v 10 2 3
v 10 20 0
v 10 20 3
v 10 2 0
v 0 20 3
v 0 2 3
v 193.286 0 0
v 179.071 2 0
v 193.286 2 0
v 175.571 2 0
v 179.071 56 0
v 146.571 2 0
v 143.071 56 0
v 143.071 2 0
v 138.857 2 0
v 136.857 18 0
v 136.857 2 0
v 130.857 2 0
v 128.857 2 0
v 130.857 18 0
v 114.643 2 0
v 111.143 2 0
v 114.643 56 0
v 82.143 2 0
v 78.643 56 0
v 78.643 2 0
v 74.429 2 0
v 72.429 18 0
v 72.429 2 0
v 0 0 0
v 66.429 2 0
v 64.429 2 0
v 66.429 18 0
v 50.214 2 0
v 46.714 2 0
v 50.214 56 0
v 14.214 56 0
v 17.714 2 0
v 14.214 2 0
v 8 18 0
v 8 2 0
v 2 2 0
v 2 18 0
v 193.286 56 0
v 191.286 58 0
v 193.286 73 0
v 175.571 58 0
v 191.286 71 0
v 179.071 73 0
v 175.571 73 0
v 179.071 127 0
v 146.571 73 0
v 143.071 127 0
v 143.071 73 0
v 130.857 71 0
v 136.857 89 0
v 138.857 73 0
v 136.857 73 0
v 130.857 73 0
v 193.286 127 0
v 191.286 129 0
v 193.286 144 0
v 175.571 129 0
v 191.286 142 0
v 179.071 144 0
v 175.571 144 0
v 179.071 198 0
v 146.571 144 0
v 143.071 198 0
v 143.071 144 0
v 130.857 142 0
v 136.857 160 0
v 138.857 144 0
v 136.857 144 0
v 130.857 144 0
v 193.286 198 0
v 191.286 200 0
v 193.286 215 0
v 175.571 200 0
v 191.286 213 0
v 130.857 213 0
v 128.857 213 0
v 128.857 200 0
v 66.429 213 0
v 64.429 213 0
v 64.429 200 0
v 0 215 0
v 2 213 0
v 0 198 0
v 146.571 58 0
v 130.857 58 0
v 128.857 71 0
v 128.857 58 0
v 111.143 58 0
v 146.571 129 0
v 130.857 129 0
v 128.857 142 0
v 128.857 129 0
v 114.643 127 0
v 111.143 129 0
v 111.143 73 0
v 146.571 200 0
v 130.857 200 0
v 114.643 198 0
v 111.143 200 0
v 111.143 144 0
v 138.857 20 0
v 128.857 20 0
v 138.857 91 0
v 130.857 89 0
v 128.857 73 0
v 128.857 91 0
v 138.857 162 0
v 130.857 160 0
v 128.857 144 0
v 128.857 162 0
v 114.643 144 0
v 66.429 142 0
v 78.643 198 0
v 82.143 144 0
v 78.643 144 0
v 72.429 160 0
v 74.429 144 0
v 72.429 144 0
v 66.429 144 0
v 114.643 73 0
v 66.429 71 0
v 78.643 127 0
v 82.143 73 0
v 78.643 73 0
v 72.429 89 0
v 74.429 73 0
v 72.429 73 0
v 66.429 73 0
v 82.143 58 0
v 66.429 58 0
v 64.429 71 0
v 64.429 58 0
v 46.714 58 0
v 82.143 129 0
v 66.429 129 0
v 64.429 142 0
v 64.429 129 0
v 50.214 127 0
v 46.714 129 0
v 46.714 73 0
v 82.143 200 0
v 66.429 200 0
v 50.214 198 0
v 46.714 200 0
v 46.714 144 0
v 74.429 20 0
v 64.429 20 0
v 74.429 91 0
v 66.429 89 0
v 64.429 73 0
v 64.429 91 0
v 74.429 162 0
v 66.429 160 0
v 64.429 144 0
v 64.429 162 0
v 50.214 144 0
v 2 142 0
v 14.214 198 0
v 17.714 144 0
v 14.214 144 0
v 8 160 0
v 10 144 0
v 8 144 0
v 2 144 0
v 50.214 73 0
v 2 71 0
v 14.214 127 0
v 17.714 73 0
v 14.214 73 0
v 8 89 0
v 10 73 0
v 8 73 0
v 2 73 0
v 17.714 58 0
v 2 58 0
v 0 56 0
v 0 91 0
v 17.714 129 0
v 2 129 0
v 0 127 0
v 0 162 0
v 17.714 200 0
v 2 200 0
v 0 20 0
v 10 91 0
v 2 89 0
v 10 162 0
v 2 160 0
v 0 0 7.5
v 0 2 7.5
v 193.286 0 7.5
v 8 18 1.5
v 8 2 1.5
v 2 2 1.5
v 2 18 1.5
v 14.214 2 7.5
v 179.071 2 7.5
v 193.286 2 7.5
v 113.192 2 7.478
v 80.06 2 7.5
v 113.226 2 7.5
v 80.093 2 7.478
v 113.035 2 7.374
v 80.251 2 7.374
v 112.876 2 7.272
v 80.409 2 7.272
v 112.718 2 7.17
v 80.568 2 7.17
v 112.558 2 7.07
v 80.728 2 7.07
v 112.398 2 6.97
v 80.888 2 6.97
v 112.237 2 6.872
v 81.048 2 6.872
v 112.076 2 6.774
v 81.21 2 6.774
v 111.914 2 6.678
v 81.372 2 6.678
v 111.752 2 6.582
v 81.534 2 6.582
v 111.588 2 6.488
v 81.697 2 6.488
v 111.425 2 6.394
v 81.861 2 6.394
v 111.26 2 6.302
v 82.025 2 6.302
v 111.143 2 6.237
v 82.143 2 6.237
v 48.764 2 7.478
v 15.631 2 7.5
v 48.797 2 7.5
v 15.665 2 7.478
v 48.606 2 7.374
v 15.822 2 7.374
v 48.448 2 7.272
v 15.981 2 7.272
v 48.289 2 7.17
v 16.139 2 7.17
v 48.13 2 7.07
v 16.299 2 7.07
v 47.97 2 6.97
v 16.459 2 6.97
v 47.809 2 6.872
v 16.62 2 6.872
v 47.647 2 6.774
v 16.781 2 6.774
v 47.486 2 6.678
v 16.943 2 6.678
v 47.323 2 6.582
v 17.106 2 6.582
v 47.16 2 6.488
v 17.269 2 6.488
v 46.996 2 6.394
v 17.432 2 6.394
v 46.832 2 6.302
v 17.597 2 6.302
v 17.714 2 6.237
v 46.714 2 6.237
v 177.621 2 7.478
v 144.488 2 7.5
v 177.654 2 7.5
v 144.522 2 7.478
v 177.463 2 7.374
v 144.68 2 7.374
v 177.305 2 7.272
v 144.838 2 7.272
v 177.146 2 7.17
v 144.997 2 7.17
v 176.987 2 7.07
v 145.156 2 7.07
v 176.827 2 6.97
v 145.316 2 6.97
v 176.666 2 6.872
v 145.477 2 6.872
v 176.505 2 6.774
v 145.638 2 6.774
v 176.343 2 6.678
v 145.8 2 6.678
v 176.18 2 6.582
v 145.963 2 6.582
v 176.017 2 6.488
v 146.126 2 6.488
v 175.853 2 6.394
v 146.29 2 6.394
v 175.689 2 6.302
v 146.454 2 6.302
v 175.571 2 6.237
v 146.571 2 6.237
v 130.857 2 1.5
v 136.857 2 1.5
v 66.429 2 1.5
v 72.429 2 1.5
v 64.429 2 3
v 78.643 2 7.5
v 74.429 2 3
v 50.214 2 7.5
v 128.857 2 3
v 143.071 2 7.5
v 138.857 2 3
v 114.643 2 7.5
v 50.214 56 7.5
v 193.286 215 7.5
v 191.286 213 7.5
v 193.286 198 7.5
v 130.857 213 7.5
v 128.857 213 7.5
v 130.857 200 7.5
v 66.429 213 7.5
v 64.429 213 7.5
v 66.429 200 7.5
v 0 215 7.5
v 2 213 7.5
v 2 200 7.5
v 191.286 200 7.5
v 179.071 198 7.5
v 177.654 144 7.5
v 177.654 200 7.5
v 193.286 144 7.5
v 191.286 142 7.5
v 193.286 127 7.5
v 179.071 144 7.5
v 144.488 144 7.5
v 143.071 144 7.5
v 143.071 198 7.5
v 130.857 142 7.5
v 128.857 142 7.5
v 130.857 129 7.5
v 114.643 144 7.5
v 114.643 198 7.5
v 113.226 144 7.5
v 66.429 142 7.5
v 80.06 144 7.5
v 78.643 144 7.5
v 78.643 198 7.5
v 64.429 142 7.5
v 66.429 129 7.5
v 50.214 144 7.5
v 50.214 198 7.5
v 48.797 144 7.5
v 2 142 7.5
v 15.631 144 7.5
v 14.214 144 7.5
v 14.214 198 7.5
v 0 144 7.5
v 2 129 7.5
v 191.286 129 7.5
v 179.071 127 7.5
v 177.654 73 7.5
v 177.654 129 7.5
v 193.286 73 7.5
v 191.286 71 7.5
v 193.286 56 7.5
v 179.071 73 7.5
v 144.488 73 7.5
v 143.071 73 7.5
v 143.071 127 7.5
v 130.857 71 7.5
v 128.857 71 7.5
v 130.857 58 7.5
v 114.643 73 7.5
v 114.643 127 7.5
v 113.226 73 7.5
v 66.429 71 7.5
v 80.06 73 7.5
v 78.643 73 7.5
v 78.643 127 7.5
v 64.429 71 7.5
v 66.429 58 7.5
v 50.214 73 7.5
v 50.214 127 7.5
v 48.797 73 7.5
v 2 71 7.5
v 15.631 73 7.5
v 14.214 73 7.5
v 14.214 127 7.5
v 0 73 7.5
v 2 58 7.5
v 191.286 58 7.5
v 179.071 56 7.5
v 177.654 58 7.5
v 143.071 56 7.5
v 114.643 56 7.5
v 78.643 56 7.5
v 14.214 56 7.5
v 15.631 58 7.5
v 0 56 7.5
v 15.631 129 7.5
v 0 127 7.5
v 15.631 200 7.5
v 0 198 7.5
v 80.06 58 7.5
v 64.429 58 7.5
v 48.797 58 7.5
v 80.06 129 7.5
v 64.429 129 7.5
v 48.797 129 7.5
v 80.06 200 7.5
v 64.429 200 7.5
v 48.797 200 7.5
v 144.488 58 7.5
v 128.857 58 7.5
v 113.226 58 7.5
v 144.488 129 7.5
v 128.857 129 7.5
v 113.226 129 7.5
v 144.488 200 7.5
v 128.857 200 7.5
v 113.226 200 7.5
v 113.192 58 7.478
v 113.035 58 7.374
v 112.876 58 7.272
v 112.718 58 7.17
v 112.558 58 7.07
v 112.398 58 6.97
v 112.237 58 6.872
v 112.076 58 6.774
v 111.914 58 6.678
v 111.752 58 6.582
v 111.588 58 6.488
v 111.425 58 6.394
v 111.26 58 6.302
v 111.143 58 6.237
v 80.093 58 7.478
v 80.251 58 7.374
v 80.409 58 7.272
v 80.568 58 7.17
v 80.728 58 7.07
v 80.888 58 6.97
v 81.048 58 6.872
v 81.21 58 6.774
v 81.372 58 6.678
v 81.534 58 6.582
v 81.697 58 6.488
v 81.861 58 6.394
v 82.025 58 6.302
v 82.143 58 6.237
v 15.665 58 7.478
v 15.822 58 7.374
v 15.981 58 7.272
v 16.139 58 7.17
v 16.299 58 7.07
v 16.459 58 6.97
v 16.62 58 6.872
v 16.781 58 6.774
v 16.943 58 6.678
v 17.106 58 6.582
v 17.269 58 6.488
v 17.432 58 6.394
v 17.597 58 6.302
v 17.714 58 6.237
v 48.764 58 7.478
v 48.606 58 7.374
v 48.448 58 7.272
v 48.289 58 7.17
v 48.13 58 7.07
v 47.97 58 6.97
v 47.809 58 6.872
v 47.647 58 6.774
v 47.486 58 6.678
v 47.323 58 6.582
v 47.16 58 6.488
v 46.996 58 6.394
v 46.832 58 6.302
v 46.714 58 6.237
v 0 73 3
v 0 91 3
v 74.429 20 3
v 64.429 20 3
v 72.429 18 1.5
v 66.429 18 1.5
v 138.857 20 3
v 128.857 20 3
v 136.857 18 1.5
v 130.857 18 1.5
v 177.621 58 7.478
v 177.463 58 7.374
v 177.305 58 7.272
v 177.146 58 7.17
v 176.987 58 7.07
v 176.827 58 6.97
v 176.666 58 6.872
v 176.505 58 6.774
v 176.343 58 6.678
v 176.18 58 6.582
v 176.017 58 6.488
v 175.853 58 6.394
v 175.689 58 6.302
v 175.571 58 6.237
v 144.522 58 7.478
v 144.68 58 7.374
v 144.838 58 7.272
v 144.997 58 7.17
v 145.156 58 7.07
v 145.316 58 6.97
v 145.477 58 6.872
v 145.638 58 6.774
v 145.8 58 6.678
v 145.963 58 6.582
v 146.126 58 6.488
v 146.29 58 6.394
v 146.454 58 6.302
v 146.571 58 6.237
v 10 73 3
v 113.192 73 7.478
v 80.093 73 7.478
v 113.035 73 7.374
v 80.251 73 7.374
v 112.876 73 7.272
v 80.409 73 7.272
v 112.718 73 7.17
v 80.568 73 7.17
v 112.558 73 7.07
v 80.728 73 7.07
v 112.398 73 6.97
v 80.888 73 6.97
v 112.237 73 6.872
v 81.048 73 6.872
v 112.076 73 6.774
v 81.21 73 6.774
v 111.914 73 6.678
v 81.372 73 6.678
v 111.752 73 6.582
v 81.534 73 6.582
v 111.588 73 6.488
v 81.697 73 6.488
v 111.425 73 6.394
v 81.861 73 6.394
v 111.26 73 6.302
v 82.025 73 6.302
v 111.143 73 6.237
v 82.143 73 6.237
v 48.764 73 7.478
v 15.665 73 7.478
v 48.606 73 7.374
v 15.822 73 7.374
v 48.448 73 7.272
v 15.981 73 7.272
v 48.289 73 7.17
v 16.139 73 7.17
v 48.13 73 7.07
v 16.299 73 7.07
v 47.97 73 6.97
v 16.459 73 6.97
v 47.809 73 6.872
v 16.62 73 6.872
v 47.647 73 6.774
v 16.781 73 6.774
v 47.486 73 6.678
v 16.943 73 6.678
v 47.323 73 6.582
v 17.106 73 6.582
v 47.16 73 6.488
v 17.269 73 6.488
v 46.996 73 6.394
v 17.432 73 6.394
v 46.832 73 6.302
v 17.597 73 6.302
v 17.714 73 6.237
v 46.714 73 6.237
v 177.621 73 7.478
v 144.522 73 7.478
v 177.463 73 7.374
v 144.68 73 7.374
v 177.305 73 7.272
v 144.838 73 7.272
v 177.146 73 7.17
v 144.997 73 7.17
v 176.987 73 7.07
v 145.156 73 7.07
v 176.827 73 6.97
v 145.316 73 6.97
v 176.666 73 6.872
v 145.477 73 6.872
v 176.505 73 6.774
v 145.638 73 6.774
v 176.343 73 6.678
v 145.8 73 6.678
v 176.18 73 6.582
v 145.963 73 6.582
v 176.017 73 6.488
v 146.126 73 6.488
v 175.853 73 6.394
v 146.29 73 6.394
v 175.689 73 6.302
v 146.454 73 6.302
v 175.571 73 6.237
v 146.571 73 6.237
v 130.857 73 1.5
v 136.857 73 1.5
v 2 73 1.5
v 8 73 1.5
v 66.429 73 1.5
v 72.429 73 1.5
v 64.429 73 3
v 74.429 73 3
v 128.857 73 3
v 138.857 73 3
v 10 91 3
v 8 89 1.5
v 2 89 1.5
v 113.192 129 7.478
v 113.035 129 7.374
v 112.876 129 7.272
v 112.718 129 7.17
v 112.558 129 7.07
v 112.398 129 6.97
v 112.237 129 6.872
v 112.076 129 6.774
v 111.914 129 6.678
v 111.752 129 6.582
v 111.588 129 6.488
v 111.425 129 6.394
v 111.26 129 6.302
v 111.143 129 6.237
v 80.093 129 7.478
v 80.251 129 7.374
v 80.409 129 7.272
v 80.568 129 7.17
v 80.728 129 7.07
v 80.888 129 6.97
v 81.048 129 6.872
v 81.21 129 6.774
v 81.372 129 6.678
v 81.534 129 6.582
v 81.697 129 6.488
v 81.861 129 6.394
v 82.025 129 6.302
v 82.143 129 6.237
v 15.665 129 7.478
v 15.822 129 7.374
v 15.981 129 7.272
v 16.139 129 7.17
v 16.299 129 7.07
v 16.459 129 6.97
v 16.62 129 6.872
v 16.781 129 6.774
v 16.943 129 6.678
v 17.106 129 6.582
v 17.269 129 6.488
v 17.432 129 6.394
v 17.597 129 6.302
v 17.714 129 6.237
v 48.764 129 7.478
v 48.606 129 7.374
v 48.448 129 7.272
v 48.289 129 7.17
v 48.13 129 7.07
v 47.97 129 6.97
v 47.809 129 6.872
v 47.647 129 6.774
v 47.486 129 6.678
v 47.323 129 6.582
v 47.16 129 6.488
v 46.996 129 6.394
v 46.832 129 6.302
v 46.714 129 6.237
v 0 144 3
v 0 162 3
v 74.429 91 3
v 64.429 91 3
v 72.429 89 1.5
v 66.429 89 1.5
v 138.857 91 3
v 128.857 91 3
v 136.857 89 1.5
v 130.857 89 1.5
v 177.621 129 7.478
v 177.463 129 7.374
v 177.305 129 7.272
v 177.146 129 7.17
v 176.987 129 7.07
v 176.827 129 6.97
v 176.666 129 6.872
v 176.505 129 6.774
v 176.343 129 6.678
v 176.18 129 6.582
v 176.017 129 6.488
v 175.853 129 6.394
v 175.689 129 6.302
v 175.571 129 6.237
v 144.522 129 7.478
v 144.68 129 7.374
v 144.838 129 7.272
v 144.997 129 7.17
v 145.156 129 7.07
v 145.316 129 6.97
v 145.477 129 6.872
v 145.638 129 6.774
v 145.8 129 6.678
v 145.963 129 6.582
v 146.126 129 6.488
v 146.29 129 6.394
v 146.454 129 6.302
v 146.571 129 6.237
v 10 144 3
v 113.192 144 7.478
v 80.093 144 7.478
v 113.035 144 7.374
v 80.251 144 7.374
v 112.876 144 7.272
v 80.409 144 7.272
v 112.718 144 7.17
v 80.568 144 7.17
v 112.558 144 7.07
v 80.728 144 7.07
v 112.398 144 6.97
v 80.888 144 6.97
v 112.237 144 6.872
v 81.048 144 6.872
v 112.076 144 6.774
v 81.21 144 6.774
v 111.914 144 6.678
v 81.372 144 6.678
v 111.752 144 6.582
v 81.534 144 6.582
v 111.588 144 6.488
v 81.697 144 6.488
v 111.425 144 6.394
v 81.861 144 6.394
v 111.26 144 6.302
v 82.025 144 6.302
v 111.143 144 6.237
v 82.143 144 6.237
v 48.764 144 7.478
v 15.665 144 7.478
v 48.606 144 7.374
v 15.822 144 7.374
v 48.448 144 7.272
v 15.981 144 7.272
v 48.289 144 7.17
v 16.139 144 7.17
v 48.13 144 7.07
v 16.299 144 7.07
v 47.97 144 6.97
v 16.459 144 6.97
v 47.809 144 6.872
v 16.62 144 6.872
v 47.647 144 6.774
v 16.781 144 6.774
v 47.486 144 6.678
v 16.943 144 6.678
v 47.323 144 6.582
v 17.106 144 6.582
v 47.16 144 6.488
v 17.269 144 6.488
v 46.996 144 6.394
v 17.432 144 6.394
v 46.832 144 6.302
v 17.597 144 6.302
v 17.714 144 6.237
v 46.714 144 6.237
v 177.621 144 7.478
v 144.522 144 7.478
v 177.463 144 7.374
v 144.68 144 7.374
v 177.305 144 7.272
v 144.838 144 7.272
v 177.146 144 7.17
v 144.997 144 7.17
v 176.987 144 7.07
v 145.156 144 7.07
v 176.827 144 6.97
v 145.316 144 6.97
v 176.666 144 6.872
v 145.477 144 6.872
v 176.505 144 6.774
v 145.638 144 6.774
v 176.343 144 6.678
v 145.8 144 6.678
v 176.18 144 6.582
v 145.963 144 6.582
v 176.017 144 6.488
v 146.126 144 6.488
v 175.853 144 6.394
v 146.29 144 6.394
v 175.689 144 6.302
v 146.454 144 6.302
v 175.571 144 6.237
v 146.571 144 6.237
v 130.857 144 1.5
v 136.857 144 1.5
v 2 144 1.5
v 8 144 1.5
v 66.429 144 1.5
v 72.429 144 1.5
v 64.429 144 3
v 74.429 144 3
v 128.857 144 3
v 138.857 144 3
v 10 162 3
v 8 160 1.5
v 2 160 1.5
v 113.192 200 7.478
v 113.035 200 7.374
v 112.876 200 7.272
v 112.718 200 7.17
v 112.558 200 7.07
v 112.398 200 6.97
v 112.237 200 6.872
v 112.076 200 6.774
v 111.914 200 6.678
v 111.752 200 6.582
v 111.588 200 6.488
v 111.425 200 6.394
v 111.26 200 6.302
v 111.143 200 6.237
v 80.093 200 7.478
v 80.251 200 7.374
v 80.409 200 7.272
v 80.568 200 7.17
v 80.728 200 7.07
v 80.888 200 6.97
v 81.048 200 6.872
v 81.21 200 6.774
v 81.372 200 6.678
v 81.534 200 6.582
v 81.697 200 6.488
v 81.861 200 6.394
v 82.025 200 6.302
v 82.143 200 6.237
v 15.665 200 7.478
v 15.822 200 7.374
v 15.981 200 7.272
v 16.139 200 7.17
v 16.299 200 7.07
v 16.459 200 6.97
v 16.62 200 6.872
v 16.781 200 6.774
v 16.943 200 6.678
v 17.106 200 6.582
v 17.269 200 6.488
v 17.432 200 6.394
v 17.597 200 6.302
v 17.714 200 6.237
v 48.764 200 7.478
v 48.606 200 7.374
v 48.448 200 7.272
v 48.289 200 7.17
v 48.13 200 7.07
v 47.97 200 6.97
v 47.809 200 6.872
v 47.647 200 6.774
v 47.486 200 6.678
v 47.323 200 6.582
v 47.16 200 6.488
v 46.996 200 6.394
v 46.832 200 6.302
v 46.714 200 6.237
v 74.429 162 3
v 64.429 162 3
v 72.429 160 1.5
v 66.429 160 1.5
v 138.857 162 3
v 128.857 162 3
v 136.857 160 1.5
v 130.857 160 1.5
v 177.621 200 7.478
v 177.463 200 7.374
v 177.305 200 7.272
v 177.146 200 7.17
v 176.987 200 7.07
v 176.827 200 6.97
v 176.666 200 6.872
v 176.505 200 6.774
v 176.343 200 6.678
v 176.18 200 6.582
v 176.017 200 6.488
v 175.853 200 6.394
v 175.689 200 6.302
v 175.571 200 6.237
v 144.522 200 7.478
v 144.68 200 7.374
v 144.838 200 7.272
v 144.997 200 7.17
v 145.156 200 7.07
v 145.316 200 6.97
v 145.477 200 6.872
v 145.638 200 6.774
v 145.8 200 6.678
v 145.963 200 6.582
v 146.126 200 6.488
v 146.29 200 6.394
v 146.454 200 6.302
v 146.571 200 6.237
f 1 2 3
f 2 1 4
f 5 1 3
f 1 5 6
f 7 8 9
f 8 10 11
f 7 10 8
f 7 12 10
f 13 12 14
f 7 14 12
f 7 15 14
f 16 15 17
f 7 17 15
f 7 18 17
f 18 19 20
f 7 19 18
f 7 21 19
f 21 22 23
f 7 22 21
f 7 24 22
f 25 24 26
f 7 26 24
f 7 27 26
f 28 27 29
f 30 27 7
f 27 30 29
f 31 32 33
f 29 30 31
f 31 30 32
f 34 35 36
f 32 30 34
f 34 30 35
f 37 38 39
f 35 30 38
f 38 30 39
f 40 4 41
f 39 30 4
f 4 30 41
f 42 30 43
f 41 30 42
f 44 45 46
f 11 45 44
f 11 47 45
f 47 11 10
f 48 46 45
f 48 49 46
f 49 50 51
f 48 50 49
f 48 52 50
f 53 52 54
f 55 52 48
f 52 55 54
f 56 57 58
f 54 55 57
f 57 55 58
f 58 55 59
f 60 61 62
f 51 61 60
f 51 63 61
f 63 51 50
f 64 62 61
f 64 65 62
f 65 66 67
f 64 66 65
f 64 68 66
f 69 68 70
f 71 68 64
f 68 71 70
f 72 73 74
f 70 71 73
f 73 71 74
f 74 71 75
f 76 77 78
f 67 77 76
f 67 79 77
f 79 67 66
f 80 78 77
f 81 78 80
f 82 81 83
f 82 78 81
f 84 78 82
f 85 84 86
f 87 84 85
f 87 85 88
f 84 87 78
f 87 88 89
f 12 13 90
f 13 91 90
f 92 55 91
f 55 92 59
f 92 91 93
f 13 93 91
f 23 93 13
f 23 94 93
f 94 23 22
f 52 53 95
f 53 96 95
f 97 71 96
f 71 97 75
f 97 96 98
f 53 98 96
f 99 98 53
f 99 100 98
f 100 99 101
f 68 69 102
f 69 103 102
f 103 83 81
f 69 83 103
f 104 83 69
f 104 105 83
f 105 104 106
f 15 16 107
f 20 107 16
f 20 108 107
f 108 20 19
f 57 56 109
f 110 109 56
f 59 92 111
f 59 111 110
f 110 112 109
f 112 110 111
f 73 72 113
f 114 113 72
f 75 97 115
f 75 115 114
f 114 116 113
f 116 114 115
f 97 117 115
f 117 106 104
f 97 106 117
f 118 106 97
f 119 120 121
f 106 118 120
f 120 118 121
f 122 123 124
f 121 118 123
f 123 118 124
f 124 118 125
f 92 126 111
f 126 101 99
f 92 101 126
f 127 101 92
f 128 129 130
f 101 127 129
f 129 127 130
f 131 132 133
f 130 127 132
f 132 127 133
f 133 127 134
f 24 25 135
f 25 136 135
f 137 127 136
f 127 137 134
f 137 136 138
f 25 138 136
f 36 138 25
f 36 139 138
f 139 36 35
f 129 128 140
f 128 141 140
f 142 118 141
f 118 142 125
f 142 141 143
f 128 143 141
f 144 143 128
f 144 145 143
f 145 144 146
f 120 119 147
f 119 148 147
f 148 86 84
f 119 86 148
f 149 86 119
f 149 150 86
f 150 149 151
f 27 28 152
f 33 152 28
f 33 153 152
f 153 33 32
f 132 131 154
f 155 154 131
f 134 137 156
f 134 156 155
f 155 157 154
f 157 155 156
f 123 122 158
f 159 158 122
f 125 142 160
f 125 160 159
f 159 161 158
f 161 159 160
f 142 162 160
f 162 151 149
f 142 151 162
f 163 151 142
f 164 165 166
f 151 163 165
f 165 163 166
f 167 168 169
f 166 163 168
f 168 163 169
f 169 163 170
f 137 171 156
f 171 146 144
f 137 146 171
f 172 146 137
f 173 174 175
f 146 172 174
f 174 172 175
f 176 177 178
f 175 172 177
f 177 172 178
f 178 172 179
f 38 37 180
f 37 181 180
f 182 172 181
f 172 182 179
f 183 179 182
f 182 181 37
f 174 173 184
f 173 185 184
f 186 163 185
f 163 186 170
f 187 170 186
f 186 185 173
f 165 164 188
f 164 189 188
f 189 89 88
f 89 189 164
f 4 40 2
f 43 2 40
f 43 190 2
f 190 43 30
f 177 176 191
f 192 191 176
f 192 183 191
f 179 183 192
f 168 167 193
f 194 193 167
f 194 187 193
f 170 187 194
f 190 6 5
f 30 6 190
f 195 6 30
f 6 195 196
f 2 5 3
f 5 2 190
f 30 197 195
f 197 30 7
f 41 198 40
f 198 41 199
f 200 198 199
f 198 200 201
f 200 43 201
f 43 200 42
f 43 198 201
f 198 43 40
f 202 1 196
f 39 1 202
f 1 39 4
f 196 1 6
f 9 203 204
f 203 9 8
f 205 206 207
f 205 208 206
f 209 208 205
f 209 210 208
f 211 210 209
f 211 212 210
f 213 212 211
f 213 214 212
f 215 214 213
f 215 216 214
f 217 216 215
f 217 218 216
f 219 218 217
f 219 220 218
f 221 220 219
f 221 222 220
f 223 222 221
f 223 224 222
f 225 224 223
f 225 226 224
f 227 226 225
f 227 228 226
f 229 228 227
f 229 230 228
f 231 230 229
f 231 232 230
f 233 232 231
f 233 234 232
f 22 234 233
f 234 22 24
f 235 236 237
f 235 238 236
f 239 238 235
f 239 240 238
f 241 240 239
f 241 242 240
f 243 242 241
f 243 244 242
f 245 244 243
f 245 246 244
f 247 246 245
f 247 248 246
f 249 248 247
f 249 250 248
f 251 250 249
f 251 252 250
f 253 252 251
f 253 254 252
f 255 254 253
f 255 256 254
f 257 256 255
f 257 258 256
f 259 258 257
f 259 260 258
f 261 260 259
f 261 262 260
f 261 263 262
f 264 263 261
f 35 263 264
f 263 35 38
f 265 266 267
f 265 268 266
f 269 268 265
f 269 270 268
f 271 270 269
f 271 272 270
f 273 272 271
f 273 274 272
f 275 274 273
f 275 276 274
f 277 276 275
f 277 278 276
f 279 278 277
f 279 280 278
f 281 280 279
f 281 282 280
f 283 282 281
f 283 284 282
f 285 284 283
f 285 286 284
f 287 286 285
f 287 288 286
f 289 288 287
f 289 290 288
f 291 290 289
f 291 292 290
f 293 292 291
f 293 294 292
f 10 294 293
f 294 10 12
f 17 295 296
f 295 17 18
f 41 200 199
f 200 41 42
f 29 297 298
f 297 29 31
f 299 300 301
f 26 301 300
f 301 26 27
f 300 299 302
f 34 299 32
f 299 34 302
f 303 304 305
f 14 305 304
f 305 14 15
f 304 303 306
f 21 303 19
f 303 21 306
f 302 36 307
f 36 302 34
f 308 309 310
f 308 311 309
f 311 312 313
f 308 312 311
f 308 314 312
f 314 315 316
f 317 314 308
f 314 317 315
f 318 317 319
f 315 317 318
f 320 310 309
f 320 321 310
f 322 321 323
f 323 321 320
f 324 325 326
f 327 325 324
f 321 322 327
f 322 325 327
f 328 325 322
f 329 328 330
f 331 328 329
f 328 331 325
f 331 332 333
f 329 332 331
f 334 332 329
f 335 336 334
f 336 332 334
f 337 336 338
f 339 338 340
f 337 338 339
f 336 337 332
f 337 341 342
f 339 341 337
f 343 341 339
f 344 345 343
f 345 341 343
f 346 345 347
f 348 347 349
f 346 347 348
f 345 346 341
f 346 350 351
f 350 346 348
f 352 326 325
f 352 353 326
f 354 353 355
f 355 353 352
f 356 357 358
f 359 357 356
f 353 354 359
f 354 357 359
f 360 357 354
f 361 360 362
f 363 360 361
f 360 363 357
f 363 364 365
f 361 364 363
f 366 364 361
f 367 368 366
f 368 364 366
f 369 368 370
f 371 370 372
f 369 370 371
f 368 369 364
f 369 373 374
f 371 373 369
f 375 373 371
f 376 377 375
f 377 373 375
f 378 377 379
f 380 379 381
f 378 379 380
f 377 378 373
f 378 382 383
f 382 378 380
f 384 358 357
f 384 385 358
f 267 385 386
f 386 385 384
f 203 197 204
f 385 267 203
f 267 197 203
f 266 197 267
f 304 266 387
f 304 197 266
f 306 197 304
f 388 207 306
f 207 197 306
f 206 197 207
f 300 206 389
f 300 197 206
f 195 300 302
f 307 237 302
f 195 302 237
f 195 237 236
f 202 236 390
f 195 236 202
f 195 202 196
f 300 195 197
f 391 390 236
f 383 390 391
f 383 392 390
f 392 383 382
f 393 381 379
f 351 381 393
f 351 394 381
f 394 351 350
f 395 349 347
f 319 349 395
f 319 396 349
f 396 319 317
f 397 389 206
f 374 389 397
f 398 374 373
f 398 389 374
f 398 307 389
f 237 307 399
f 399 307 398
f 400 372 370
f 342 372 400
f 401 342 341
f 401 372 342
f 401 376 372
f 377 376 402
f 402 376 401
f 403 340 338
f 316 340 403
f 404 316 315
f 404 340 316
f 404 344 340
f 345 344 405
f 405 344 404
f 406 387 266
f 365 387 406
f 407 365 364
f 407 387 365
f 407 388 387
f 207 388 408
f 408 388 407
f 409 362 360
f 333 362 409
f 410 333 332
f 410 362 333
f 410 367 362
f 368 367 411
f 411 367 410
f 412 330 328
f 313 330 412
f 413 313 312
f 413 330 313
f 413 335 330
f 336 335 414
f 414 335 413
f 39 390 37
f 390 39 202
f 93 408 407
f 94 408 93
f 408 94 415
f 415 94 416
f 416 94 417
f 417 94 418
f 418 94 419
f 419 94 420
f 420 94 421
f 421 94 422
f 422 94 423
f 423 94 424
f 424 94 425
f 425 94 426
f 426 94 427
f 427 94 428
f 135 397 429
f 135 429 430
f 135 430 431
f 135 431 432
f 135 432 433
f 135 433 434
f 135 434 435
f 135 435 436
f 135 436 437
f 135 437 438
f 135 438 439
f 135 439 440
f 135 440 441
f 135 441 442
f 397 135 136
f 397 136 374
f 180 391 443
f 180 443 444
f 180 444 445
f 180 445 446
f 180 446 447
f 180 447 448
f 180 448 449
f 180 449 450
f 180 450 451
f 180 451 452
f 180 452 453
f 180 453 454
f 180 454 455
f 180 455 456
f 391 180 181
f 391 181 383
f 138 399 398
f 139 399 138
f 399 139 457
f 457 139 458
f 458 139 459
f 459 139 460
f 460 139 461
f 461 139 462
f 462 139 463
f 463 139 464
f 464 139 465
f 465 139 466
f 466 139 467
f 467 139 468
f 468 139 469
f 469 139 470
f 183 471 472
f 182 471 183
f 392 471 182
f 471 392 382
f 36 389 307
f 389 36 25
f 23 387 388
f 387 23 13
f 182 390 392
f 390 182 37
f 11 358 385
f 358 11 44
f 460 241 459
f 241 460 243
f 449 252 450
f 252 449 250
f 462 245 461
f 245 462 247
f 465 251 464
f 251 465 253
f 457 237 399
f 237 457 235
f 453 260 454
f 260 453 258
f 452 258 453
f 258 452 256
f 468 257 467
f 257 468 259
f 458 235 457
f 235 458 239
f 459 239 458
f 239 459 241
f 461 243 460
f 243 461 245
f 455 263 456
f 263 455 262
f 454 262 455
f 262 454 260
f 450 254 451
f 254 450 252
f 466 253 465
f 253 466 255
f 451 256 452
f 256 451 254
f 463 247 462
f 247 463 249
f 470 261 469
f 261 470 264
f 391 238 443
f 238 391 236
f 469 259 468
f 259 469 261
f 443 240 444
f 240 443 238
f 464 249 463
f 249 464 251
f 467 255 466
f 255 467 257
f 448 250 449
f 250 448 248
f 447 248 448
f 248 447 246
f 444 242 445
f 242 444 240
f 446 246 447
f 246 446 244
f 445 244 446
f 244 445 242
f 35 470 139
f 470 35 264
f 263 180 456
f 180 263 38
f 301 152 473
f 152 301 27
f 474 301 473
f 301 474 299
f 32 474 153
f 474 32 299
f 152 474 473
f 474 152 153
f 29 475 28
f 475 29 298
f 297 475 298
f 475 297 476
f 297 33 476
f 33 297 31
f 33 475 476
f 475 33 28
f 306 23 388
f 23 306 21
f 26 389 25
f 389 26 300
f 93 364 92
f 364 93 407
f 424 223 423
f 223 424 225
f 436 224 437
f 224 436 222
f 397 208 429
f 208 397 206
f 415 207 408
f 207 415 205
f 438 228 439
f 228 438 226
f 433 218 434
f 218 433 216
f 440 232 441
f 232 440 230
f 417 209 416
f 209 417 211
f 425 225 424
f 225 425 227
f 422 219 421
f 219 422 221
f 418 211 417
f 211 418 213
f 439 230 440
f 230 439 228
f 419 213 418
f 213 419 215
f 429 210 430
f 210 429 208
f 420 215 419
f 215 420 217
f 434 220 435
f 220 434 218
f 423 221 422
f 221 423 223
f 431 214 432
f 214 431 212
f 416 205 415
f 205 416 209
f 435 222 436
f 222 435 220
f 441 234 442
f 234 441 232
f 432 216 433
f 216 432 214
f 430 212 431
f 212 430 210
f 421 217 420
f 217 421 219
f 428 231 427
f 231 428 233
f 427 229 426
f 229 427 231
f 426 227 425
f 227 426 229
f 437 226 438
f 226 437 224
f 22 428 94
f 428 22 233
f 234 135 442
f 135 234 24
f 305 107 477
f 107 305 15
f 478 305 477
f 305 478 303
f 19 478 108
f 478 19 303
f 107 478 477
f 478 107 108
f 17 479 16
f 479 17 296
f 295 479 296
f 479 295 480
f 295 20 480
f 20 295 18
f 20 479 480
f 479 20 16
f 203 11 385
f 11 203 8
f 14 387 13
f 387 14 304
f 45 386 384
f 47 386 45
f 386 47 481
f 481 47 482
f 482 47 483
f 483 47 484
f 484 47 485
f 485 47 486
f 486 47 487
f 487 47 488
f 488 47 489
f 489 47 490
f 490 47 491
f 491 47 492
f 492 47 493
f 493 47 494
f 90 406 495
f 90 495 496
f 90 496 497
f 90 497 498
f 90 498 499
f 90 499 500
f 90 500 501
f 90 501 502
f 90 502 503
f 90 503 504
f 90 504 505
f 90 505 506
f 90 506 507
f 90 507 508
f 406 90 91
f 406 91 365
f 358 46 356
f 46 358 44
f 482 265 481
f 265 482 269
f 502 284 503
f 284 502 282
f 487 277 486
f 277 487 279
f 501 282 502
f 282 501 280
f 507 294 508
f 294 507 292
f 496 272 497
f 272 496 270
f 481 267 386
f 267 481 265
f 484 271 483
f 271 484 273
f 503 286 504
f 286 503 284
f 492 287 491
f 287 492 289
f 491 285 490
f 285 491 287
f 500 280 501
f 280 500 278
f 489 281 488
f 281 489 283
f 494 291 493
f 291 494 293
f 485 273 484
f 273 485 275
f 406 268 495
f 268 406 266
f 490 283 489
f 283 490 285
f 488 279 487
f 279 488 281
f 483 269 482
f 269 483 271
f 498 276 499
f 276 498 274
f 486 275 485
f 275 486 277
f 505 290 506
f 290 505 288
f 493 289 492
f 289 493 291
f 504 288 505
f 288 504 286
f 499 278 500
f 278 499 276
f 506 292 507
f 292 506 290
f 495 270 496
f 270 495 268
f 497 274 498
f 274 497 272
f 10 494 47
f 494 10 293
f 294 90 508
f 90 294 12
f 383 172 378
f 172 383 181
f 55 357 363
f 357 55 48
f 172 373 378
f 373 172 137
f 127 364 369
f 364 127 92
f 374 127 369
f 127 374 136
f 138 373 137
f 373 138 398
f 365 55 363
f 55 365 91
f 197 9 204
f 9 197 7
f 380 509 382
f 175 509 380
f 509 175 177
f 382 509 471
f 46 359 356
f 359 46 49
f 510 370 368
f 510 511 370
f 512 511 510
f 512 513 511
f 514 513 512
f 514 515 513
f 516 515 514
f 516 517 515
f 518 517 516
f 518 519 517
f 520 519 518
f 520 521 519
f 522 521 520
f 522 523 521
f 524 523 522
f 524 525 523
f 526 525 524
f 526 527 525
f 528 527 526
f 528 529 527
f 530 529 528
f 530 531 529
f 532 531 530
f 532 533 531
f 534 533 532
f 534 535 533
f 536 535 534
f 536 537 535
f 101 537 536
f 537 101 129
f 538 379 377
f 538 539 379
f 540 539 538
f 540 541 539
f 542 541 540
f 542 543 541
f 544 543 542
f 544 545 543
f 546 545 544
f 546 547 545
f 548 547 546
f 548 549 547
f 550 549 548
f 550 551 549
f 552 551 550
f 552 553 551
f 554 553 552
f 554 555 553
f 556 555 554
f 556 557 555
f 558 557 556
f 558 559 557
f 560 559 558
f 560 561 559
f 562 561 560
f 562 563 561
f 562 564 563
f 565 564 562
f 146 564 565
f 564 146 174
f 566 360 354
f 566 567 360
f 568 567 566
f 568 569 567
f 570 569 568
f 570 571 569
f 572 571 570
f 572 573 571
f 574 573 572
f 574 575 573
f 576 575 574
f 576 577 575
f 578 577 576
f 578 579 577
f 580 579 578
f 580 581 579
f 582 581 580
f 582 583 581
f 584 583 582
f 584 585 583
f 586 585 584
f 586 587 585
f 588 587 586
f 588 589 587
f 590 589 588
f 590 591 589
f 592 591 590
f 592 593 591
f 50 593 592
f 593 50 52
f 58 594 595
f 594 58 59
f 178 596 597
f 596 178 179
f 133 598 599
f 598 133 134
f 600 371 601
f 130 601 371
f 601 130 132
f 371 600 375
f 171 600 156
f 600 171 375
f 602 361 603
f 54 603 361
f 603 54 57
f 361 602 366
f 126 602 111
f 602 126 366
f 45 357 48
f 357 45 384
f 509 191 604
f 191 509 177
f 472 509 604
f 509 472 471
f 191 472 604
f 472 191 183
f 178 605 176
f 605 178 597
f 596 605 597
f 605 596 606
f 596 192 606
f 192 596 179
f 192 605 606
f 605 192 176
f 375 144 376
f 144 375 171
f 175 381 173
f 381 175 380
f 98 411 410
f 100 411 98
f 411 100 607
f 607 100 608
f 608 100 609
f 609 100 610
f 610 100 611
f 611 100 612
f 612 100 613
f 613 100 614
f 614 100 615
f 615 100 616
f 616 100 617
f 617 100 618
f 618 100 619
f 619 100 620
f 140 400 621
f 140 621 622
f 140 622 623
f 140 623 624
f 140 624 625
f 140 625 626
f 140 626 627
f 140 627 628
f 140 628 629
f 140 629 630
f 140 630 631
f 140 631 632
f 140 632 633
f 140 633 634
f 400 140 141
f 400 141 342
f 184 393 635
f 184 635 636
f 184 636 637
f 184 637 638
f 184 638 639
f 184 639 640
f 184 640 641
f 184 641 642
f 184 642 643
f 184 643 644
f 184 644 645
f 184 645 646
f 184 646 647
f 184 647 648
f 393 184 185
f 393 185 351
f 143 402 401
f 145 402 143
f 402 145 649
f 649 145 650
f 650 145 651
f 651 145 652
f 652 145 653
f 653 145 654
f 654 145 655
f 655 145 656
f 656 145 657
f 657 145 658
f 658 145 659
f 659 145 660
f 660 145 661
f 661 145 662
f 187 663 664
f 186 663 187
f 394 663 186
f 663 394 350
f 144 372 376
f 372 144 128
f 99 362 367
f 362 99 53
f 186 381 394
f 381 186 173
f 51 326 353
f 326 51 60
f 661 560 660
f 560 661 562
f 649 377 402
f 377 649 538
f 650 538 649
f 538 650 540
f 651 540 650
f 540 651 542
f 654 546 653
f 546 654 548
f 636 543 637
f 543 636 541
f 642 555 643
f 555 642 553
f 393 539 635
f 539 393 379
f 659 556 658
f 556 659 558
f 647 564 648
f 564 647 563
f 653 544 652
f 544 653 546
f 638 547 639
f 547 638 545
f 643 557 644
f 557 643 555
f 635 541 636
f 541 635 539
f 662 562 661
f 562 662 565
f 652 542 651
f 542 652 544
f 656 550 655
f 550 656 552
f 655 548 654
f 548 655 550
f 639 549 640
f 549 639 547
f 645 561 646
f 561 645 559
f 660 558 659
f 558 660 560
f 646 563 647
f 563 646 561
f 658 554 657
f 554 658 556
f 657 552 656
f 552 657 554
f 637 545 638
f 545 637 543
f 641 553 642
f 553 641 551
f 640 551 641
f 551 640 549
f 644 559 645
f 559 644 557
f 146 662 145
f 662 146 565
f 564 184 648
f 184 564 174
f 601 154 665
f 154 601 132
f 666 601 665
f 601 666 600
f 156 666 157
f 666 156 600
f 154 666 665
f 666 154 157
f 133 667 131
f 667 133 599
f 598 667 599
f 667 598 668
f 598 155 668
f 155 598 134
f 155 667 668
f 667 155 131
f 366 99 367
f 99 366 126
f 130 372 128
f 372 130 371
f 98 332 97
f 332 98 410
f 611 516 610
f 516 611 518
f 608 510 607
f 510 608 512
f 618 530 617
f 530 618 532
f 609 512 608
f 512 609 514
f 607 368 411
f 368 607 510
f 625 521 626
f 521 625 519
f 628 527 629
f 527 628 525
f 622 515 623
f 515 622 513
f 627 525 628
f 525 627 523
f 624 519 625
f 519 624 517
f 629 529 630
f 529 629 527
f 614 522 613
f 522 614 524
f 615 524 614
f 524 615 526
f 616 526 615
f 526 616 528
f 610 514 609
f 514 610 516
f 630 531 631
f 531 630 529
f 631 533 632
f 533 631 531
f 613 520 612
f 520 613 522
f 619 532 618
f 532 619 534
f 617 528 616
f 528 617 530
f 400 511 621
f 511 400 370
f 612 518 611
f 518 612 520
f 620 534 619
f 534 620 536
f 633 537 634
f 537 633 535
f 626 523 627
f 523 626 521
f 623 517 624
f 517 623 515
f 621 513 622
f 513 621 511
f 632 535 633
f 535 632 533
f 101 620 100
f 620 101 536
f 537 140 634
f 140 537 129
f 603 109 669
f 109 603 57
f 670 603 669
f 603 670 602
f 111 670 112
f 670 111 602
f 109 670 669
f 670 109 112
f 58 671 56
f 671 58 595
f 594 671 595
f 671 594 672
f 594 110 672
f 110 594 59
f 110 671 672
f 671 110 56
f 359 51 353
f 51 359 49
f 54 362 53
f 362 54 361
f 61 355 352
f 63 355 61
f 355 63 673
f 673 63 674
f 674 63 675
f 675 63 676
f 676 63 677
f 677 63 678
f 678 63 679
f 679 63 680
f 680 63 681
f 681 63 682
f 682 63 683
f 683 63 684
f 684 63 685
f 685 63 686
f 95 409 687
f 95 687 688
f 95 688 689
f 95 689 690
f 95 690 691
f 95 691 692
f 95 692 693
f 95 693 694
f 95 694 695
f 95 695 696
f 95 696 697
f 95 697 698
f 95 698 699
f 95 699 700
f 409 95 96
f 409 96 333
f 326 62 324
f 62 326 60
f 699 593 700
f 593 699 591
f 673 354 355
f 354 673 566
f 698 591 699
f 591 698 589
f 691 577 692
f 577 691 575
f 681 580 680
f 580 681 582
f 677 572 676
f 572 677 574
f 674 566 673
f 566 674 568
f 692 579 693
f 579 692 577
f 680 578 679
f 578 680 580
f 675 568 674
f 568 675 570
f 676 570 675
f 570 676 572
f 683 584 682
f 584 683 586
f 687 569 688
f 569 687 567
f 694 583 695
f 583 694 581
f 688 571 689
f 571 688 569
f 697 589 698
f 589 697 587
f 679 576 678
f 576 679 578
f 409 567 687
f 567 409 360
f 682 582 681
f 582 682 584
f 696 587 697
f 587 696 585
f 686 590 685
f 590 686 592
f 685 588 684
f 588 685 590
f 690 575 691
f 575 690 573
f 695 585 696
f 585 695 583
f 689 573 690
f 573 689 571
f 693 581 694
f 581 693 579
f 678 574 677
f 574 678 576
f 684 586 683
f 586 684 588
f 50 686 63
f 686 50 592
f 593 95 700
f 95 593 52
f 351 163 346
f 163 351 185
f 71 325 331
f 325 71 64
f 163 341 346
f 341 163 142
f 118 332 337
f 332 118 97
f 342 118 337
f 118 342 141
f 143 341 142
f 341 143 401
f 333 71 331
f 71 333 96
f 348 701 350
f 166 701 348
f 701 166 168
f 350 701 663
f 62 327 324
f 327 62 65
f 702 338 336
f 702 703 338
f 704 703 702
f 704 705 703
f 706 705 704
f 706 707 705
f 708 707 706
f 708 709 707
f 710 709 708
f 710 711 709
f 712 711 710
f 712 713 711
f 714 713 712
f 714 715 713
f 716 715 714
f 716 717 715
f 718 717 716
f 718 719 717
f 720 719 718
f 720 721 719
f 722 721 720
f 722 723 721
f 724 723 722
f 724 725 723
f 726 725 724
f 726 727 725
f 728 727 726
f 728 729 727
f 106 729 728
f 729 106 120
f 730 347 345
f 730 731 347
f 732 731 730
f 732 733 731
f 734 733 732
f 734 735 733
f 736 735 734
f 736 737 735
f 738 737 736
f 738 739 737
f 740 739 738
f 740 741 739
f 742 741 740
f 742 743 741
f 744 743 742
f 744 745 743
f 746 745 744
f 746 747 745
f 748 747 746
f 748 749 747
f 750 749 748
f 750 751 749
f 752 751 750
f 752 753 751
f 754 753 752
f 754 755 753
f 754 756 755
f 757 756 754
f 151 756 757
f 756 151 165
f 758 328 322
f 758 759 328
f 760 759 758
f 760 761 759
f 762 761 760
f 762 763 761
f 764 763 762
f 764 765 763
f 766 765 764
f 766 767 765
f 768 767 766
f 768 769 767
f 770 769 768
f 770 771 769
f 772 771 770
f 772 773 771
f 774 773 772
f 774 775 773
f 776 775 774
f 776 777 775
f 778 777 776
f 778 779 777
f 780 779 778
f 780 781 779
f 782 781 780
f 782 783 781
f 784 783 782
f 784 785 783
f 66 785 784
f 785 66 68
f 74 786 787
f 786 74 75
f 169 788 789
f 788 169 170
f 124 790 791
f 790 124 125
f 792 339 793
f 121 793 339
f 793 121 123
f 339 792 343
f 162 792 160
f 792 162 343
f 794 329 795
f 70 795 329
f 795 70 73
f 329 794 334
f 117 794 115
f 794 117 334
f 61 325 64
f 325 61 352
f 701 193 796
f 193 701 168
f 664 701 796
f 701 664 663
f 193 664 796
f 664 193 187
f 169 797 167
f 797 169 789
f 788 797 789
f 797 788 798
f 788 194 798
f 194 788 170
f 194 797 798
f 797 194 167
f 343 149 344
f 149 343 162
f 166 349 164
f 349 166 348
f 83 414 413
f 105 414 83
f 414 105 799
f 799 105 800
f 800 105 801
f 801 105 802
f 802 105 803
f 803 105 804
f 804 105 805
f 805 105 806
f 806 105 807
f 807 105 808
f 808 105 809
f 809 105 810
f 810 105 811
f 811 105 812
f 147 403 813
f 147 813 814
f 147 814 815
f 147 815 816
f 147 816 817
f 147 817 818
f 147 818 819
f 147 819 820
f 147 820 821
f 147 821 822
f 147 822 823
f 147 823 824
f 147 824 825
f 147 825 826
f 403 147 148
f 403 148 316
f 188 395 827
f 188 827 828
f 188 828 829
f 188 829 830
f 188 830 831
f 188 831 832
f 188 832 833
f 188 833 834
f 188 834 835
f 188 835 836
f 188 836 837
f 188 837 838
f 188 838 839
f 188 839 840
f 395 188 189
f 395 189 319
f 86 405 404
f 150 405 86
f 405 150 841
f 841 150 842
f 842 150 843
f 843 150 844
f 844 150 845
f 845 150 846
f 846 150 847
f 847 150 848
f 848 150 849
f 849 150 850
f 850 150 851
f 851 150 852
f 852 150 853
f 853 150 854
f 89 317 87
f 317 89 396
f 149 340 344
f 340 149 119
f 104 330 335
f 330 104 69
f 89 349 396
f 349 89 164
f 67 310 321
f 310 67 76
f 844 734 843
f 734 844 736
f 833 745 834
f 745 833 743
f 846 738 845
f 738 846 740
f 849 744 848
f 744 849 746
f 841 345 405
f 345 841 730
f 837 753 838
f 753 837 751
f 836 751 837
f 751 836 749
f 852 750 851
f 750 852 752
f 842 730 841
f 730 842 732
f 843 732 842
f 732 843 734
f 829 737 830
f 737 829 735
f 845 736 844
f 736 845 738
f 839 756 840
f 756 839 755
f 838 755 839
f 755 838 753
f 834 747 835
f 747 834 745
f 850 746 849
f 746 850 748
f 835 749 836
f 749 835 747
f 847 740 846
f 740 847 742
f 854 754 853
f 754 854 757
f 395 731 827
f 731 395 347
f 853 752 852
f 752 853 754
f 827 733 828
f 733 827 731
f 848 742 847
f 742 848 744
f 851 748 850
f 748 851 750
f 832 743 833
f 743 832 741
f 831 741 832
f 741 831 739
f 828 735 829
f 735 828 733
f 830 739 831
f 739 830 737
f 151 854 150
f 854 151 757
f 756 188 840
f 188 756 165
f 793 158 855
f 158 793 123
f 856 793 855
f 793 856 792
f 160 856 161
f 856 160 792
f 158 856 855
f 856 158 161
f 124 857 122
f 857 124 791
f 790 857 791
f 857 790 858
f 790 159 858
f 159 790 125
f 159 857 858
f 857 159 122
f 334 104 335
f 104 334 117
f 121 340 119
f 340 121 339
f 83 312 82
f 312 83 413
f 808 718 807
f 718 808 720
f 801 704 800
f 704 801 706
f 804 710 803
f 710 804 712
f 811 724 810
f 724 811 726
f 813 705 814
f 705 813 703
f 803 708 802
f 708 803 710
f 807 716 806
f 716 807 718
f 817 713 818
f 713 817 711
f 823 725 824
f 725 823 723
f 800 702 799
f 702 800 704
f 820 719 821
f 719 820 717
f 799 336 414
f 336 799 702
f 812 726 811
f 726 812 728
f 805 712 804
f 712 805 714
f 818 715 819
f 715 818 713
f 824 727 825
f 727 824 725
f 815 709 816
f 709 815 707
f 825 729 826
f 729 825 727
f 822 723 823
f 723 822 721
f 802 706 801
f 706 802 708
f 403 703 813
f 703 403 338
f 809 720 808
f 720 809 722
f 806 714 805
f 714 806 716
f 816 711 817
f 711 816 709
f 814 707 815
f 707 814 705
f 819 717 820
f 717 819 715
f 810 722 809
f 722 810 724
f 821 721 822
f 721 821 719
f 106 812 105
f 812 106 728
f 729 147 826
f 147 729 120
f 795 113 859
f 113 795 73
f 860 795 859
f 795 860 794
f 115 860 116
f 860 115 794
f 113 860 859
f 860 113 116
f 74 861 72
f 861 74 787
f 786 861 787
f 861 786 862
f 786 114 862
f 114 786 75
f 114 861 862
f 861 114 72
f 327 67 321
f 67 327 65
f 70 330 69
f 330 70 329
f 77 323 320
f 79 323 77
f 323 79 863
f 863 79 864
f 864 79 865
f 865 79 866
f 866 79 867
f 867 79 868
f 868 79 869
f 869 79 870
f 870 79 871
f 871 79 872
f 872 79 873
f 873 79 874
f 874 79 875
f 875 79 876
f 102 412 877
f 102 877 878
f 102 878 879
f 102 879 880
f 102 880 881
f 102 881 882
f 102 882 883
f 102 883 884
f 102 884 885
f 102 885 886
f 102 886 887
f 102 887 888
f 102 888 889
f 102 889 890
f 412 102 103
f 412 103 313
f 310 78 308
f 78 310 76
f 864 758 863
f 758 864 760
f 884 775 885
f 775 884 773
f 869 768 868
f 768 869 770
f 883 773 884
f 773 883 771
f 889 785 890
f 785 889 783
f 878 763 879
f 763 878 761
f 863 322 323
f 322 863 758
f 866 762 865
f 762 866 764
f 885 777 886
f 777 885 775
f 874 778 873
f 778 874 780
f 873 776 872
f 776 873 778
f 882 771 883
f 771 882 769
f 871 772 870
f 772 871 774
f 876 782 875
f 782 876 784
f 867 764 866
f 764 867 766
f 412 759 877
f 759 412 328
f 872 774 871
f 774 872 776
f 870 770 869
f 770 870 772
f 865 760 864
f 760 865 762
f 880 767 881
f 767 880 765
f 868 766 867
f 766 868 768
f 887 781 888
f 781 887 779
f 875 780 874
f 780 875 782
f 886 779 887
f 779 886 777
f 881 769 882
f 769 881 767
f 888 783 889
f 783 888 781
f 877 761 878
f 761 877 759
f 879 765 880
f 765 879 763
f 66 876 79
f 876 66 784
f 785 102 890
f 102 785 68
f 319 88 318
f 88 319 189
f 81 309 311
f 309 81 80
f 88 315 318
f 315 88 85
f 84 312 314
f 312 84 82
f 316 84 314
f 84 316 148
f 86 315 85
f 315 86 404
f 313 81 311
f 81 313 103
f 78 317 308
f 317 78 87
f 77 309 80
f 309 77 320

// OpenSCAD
// file: waxbase.scad
waxbase();

module waxbase(width=10, length=20, height=3, width_walls=2) {

    // Everything in mm

    // width = 10; // mm
    // length = 20; // mm
    // height = 3; // mm

    // width_walls = 2; // mm - thickness of the walls

    // How high the inset should be
    height_inset = height - 1.5;

    difference() {
        // The basic block
        cube([width, length, height]);

        // The inset cube for the wax
        translate([width_walls, width_walls, 0])
            cube([width-2*width_walls, length-2*width_walls, height_inset]);
    }
}
// file: spice jar sizing.scad
// Common file to keep track of the spice jar we are working with

// Sizes for a single spice jar (mm)
diameter_lid = 63; // mm
diameter_glass = 60; // mm
height_glass = 58; // mm height of the jar part
height_top = 8; //mm Height of the top above the glass
// main file
// Units are mm
$fn=1000;

include <spice jar sizing.scad>
use <waxbase.scad>

// Total size of tray
n_jars_per_row = 3;
n_jar_rows = 3;

// Intra-jar spacing
gap_between_jar_sides = 10/7; // mm - spacing between adjacent jars
gap_between_jar_tops = 3; // mm - spacing between one row and the next

// Tray design constants
jar_holder_height = 5; // mm
height_above_bottom = 2.5; // raising off drawer bottom [mm]
fraction_length_tray_support = 0.6; // Fraction of full tray width drawn
width_rail = 2; // mm - How thick the rails should be
width_rail_support = 7; // mm - how think should the glass holder rails be?

// Calculated constants
jar_height = height_glass + height_top;
jar_width = diameter_lid;
row_height = gap_between_jar_tops + jar_height + width_rail;
row_gap_height = row_height - height_glass;
col_width = gap_between_jar_sides + jar_width;

length_tray = col_width*n_jars_per_row;
tray_height = jar_holder_height + height_above_bottom;

jar_support_width = diameter_glass*fraction_length_tray_support;
width_raft_removal = jar_support_width - width_rail_support;

// Lay out support rails and rafts
for(i_row = [0:n_jar_rows-1]) {
    union() {
        // Bottom rail (goes all the way accross)
        translate([0, i_row*row_height, 0]) {
            cube([length_tray, width_rail, tray_height]);
        }
        
        // Top rail that holds the wood top. (goes all the way accross)
        translate([0, (i_row+1)*row_height, 0])
            cube([length_tray, width_rail, tray_height]);

        // For each column, we next have to build rails, inter layer connectors, etc.
        for(i_jar = [0:n_jars_per_row-1]) {
            // The vertical link between the two rails at the top
            translate([i_jar*col_width, (i_row)*row_height, 0])
            translate([0, height_glass, 0])
                cube([width_rail, row_gap_height, tray_height]);

            // The wax holder base
            translate([i_jar*col_width, i_row*row_height, 0])
                waxbase();

            // Now the sculpted rails that will hold the
            // jars.
            difference() {
                union() {
                    // Cube raft between
                    translate([i_jar*col_width, i_row*row_height, 0])
                    translate([col_width/2.0 - jar_support_width/2.0, 0, 0])
                            cube([jar_support_width, height_glass, tray_height]);

                    // Top trail at glass lip
                    translate([i_jar*col_width, i_row*row_height+height_glass-width_rail, 0])
                        cube([col_width, width_rail, tray_height]);

                }
                // Remove the cylinder shape from the raft
                translate([i_jar*col_width, i_row*row_height])
                translate([col_width/2.0, height_glass + width_rail, diameter_glass/2.0+height_above_bottom])
                    rotate([90, 0, 0])
                        cylinder(h = height_glass, r = diameter_glass/2.0);

                // Turn the remaining raft into rails
                translate([i_jar*col_width, i_row*row_height])
                translate([col_width/2.0 - width_raft_removal/2.0, width_rail, 0])                    cube([width_raft_removal, height_glass, tray_height]);
            }
        }
        
        // Closing link between the two rails at the top
        translate([n_jars_per_row*col_width, (i_row)*row_height, 0])
        translate([-width_rail, height_glass, 0])
            cube([width_rail, row_gap_height, tray_height]);


        // Next, the rafts between them
//            for(i_jar = [0:n_jars_per_row-1]){
//                translate([i_jar*col_width, i_row*row_height, 0])
//                translate([col_width/2.0 - jar_support_width/2.0, 0, 0])
//                        cube([jar_support_width, height_glass, tray_height]);
//            }
    }
    
    // Remove the depression to hold the jars,
    // and turn them into rail
//        for (i_jar = [0:n_jars_per_row-1]){
//            union() {
//                translate([i_jar*col_width, i_row*row_height])
//                translate([col_width/2.0, height_glass + width_rail, diameter_glass/2.0+height_above_bottom])
//                    rotate([90, 0, 0])
//                        cylinder(h = height_glass, r = diameter_glass/2.0);
//
//                translate([i_jar*col_width, i_row*row_height])
//                translate([col_width/2.0 - width_raft_removal/2.0, width_rail, 0])                
//                    cube([width_raft_removal, height_glass, tray_height]);
//            }
//        }
}

// Connections between rows
//for(i_row = [1:n_jar_rows-1]) {
//    for(i_col = [0:n_jars_per_row-1]) {
//        translate([i_col*col_width, (i_row-1)*row_height, 0])
//        translate([0, height_glass, 0])
//            cube([width_rail, row_gap_height, tray_height]);
//    }
//    // And the last one in the row
//    translate([n_jars_per_row*col_width, (i_row-1)*row_height, 0])
//    translate([-width_rail, height_glass, 0])
//        cube([width_rail, row_gap_height, tray_height]);
//}
